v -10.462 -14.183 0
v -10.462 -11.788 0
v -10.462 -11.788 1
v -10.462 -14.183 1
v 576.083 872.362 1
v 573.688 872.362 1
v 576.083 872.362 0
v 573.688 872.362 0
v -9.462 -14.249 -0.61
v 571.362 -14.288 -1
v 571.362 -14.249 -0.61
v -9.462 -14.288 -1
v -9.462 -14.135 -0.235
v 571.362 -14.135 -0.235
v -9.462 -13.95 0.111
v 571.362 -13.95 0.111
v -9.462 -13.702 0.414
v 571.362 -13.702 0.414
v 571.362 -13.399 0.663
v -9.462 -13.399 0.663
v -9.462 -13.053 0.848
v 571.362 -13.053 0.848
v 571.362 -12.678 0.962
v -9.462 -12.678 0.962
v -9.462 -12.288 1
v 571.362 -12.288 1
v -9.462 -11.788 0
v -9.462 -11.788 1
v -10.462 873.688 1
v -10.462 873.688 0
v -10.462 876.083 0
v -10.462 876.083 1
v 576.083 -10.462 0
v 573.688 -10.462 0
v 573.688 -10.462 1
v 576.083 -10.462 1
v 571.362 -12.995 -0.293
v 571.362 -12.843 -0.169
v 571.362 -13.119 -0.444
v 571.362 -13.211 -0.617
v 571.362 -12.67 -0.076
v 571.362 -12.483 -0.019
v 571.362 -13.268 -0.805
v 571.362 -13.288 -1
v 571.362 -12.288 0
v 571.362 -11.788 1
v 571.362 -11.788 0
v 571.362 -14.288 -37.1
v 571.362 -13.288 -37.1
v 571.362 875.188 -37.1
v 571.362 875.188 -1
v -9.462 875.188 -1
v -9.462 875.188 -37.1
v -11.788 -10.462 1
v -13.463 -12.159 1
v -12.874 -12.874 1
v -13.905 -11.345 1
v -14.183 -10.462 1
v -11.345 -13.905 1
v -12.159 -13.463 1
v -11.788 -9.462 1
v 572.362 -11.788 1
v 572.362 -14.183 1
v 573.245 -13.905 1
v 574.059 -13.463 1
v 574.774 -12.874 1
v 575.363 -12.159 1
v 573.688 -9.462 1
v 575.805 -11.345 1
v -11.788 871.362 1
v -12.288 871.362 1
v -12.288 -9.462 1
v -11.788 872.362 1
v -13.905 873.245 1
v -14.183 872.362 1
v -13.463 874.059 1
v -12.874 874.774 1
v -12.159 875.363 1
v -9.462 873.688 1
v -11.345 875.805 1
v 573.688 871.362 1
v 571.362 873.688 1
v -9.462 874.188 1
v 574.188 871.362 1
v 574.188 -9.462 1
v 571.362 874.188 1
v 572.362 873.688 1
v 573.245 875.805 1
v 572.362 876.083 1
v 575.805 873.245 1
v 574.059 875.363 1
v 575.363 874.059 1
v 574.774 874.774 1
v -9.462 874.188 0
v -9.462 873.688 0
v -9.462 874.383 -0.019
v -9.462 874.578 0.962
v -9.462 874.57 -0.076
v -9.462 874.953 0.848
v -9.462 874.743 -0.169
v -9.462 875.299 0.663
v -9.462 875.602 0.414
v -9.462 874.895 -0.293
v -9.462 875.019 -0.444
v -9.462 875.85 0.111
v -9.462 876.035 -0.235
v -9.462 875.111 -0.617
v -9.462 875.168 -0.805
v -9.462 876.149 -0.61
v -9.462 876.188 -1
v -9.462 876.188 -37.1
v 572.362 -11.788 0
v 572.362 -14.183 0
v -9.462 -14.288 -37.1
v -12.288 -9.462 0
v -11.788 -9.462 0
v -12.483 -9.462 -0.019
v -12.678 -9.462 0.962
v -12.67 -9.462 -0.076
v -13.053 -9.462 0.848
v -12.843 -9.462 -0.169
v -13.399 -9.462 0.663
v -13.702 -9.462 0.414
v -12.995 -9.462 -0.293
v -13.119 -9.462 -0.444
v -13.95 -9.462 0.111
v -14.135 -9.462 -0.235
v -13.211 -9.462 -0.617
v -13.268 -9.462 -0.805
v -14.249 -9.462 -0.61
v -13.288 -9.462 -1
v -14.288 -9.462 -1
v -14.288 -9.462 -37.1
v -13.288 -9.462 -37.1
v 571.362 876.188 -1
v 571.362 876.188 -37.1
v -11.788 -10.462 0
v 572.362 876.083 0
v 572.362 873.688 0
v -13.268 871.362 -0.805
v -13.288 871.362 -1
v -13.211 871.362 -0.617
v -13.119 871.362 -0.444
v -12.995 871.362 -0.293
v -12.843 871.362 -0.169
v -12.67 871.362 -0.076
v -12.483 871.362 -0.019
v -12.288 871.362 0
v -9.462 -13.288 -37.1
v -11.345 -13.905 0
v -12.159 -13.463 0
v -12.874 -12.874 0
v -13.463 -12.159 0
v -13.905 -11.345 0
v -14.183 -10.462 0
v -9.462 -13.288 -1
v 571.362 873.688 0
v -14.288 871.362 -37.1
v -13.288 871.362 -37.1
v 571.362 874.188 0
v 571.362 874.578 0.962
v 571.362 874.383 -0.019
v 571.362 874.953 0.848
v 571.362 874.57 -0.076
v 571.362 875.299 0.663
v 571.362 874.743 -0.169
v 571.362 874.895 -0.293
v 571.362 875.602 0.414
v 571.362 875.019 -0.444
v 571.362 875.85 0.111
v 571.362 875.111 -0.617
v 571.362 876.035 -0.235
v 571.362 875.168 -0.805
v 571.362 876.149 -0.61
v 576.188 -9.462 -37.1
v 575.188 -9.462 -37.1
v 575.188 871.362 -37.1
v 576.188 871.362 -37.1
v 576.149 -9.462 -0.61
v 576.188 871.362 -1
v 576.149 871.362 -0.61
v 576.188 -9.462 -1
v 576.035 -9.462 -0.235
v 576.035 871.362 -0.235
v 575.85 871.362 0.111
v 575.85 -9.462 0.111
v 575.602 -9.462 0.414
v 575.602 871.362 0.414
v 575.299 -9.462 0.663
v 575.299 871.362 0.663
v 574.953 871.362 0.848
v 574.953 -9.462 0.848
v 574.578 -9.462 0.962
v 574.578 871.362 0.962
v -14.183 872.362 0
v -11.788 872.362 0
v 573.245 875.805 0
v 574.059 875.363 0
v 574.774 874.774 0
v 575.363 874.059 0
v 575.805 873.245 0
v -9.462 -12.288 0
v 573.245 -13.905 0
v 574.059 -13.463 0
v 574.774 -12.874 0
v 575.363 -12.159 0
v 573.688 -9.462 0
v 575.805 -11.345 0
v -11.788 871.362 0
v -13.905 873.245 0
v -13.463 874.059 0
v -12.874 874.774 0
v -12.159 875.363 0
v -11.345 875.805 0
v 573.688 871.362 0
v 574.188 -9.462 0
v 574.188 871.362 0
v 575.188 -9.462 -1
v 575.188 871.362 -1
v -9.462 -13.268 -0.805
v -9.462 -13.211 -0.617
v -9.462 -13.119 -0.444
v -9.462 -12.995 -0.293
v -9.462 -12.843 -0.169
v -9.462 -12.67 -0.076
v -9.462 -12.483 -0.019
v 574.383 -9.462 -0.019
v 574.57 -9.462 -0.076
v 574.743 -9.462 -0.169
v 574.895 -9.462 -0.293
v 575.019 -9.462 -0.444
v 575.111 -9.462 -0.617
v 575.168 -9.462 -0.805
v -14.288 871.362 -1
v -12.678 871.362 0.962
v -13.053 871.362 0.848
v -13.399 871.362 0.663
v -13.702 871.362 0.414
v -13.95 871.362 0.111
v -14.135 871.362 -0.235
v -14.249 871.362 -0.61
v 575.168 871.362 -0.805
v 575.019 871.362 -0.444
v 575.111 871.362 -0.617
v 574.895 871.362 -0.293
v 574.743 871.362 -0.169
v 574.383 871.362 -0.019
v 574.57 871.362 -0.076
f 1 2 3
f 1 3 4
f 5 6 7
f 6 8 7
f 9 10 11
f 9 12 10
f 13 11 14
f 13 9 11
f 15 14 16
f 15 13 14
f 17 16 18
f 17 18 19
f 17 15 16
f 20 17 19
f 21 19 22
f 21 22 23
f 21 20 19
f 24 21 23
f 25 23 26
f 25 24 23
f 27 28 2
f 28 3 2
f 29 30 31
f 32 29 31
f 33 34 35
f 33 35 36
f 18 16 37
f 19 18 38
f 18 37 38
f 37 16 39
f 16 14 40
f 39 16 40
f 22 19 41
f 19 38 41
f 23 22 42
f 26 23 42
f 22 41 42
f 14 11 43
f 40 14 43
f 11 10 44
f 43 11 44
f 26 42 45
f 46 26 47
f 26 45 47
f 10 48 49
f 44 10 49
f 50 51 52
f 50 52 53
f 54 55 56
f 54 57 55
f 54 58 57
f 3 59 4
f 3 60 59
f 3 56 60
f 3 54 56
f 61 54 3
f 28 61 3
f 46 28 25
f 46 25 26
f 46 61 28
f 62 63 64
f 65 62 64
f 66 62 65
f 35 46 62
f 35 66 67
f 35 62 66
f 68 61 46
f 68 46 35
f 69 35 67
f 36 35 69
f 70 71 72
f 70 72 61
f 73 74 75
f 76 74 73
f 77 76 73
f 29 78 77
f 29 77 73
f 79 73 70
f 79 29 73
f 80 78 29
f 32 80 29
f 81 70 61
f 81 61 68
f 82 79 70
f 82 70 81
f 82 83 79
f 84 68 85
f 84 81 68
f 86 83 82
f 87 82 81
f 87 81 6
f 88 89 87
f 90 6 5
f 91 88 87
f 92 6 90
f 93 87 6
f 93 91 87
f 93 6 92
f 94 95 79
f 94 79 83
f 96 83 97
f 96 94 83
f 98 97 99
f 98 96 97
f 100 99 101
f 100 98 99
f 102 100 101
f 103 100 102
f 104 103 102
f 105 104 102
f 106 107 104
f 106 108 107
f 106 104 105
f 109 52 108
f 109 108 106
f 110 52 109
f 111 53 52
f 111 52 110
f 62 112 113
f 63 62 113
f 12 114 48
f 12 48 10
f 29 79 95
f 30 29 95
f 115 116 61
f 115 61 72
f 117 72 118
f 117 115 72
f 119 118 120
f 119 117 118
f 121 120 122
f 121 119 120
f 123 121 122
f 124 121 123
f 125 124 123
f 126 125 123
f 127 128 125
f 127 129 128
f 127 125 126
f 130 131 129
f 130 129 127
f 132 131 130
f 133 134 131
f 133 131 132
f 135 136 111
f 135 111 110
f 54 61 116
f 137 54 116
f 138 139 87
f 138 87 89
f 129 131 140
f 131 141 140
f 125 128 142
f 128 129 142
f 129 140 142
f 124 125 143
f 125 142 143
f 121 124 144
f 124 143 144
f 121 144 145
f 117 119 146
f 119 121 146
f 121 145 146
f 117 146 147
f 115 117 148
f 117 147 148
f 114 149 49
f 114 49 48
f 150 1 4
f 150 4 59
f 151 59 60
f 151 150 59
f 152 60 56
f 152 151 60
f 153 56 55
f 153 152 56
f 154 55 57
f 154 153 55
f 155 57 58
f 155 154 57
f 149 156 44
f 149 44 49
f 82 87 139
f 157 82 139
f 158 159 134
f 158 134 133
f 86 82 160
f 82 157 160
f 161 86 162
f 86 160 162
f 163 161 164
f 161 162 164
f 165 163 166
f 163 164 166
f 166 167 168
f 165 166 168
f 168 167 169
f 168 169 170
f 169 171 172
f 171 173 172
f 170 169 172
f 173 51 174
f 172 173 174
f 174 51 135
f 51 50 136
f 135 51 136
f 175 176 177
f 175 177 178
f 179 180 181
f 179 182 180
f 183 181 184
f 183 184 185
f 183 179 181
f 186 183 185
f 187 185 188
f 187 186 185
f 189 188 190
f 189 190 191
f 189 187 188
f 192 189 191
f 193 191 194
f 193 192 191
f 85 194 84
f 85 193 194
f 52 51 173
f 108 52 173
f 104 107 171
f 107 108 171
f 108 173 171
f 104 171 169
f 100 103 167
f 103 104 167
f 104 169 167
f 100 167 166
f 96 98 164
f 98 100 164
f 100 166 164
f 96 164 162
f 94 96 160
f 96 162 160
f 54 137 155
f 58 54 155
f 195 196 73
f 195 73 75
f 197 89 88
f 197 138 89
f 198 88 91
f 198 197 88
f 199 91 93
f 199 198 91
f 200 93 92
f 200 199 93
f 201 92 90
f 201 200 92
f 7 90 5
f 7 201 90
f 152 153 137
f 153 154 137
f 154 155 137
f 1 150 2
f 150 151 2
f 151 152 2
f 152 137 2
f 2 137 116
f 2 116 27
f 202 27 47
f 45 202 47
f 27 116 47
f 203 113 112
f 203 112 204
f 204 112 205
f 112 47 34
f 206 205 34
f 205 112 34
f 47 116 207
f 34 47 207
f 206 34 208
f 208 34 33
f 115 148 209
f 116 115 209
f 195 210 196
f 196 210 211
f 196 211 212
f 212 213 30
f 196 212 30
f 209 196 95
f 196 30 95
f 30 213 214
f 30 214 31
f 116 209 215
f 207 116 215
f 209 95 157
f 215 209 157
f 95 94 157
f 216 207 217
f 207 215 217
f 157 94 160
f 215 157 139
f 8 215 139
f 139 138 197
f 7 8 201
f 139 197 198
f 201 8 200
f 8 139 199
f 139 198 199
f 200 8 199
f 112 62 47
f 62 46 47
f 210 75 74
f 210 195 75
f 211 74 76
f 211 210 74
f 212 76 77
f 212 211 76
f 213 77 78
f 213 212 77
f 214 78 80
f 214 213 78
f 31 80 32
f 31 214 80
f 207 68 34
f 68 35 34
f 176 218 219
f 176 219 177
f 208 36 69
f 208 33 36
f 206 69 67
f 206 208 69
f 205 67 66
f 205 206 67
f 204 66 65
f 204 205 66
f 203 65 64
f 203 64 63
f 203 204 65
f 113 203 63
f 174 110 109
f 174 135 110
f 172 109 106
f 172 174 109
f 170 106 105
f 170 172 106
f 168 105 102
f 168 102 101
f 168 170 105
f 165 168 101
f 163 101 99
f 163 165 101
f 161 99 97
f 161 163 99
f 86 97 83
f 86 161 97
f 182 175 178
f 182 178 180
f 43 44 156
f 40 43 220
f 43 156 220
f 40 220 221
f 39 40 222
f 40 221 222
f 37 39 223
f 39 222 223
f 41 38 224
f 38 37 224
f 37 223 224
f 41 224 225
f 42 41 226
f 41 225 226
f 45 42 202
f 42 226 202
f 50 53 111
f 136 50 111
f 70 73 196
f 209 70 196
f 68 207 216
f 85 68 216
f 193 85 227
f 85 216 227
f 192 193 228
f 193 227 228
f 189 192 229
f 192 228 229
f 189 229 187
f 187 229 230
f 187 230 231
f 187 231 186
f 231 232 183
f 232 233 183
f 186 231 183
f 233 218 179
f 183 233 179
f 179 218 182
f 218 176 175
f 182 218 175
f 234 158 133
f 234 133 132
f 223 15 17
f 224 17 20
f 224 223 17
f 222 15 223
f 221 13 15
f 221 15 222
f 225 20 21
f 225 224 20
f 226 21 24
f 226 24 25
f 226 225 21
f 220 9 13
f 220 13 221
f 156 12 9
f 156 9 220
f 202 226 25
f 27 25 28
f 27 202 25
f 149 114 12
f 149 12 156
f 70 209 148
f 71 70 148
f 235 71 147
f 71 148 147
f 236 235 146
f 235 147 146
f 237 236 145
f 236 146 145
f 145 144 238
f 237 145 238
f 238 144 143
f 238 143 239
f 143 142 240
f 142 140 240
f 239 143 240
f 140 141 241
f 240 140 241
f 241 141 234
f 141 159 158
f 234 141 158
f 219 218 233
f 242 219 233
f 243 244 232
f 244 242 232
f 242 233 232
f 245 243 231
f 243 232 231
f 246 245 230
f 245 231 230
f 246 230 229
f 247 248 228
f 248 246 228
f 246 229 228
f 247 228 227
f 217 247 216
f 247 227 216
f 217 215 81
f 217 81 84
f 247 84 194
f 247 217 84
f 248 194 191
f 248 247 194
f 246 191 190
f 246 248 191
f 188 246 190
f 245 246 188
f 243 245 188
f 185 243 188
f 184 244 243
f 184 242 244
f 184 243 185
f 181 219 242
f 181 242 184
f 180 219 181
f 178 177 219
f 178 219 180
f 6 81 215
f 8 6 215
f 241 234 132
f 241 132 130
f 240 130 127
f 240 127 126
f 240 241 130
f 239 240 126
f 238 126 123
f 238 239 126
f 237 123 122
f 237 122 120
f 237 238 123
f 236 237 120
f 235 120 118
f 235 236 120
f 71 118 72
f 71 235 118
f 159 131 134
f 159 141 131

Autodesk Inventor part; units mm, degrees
ref_plane "YZ Plane" through (0, 0, 0) normal (1, 0, 0) x (0, 1, 0)
ref_plane "XZ Plane" through (0, 0, 0) normal (0, 1, 0) x (-1, 0, 0)
ref_plane "XY Plane" through (0, 0, 0) normal (0, 0, 1) x (1, 0, 0)
sketch "Boceto1" plane through (0, 0, 0) normal (0, 0, 1) x (1, 0, 0)
  line L0 (-19.05, -19.05) -> (-19.05, 19.05)
  line L1 (19.05, -19.05) -> (-19.05, -19.05)
  line L2 (-14.2875, 16.764) -> (-14.2875, -9.4615)
  line L3 (-9.4615, -14.2875) -> (16.764, -14.2875)
  arc A0 (-14.2875, -9.4615) -> (-9.4615, -14.2875) centre (-9.4615, -9.4615) ccw
  line L4 (-14.2875, -9.4615) -> (-14.2875, 871.3615)
  line L5 (-9.4615, 876.1875) -> (571.3615, 876.1875)
  line L6 (576.1875, 871.3615) -> (576.1875, -9.4615)
  line L7 (571.3615, -14.2875) -> (-9.4615, -14.2875)
  arc A1 (571.3615, -14.2875) -> (576.1875, -9.4615) centre (571.3615, -9.4615) ccw
  arc A2 (576.1875, 871.3615) -> (571.3615, 876.1875) centre (571.3615, 871.3615) ccw
  arc A3 (-9.4615, 876.1875) -> (-14.2875, 871.3615) centre (-9.4615, 871.3615) ccw
  line L8 (-14.2875, -9.4615) -> (-14.2875, -9.4615)
  arc A4 (-14.2875, -9.4615) -> (-9.4615, -14.2875) centre (-9.4615, -9.4615) ccw
  point P0 (0, 0)
  point P1 (-14.2875, -14.2875)
  point P2 (-14.2875, 876.1875)
  point P3 (576.1875, 876.1875)
  point P4 (576.1875, -14.2875)
  dimension "d3" = 890.475
  dimension "d5" = 890.475
  dimension "d6" = 4.826
  dimension "d7" = 4.826
  dimension "d8" = 4.826
  dimension "d9" = 4.826
sketch "Boceto1 outline for Placa1" plane through (0, 0, 0) normal (0, 0, 1) x (1, 0, 0)
  line L0 (-14.2875, -9.4615) -> (-14.2875, 871.3615)
  arc A0 (-14.2875, 871.3615) -> (-9.4615, 876.1875) centre (-9.4615, 871.3615) cw
  line L1 (-9.4615, 876.1875) -> (571.3615, 876.1875)
  arc A1 (571.3615, 876.1875) -> (576.1875, 871.3615) centre (571.3615, 871.3615) cw
  line L2 (576.1875, 871.3615) -> (576.1875, -9.4615)
  arc A2 (576.1875, -9.4615) -> (571.3615, -14.2875) centre (571.3615, -9.4615) cw
  line L3 (571.3615, -14.2875) -> (-9.4615, -14.2875)
  arc A3 (-9.4615, -14.2875) -> (-14.2875, -9.4615) centre (-9.4615, -9.4615) cw
extrude "Placa1" add sketch "Boceto1 outline for Placa1" along normal blind 1
sketch "Boceto2" plane through (-9.4615, -13.2875, 1) normal (0, -1, 0) x (1, 0, 0)
  line L0 (580.823, 0) -> (0, 0)
  line L1 (0, 0) -> (0, -38.1)
  line L2 (0, -38.1) -> (580.823, -38.1)
  line L3 (580.823, -38.1) -> (580.823, 0)
edge flange "Pestaña1" height 38.1 angle 90 thickness 1 bend radius 1 thickness toward (0, -1, 0) relief straight relief width 1 relief depth 0.5 corner gap 1 corner form 0 edges at (280.95, -14.2875, 0) (-14.2875, 430.95, 0) (280.95, 876.1875, 0) (576.1875, 430.95, 0) wall of the first edge with corners at (571.3615, -13.2875, 1) (-9.4615, -13.2875, 1) (-9.4615, -13.2875, -37.1) (571.3615, -13.2875, -37.1)
bend "Doblez1"
corner "Esquina1"
equation "\"d10\" = Anchura_desahogo_plegado"
equation "\"d11\" = Profundidad_desahogo_plegado"
equation "\"d12\" = Remanente_mínimo"
equation "\"d13\" = Radio_pliegue"
equation "\"d16\" = Radio_pliegue"
equation "\"d17\" = Tamaño_destalonado"
equation "\"d18\" = TamañoSeparación"
equation "\"d19\" = Tamaño_de_radio_de_Jacobi"
equation "\"Radio_pliegue\" = Grosor"
equation "\"Anchura_desahogo_plegado\" = Grosor"
equation "\"Profundidad_desahogo_plegado\" = 0.5 * Grosor"
equation "\"Tamaño_destalonado\" = 4 * Grosor"
equation "\"Remanente_mínimo\" = 2 * Grosor"
equation "\"Radiodetransición\" = Radio_pliegue"
equation "\"Tamaño_de_radio_de_Jacobi\" = Radio_pliegue"
equation "\"TamañoSeparación\" = Grosor"
equation "\"d2\" = Radio_pliegue"
equation "\"Grosor\" = 1"
properties part number "lámina" material "Latón, amarillo claro"
